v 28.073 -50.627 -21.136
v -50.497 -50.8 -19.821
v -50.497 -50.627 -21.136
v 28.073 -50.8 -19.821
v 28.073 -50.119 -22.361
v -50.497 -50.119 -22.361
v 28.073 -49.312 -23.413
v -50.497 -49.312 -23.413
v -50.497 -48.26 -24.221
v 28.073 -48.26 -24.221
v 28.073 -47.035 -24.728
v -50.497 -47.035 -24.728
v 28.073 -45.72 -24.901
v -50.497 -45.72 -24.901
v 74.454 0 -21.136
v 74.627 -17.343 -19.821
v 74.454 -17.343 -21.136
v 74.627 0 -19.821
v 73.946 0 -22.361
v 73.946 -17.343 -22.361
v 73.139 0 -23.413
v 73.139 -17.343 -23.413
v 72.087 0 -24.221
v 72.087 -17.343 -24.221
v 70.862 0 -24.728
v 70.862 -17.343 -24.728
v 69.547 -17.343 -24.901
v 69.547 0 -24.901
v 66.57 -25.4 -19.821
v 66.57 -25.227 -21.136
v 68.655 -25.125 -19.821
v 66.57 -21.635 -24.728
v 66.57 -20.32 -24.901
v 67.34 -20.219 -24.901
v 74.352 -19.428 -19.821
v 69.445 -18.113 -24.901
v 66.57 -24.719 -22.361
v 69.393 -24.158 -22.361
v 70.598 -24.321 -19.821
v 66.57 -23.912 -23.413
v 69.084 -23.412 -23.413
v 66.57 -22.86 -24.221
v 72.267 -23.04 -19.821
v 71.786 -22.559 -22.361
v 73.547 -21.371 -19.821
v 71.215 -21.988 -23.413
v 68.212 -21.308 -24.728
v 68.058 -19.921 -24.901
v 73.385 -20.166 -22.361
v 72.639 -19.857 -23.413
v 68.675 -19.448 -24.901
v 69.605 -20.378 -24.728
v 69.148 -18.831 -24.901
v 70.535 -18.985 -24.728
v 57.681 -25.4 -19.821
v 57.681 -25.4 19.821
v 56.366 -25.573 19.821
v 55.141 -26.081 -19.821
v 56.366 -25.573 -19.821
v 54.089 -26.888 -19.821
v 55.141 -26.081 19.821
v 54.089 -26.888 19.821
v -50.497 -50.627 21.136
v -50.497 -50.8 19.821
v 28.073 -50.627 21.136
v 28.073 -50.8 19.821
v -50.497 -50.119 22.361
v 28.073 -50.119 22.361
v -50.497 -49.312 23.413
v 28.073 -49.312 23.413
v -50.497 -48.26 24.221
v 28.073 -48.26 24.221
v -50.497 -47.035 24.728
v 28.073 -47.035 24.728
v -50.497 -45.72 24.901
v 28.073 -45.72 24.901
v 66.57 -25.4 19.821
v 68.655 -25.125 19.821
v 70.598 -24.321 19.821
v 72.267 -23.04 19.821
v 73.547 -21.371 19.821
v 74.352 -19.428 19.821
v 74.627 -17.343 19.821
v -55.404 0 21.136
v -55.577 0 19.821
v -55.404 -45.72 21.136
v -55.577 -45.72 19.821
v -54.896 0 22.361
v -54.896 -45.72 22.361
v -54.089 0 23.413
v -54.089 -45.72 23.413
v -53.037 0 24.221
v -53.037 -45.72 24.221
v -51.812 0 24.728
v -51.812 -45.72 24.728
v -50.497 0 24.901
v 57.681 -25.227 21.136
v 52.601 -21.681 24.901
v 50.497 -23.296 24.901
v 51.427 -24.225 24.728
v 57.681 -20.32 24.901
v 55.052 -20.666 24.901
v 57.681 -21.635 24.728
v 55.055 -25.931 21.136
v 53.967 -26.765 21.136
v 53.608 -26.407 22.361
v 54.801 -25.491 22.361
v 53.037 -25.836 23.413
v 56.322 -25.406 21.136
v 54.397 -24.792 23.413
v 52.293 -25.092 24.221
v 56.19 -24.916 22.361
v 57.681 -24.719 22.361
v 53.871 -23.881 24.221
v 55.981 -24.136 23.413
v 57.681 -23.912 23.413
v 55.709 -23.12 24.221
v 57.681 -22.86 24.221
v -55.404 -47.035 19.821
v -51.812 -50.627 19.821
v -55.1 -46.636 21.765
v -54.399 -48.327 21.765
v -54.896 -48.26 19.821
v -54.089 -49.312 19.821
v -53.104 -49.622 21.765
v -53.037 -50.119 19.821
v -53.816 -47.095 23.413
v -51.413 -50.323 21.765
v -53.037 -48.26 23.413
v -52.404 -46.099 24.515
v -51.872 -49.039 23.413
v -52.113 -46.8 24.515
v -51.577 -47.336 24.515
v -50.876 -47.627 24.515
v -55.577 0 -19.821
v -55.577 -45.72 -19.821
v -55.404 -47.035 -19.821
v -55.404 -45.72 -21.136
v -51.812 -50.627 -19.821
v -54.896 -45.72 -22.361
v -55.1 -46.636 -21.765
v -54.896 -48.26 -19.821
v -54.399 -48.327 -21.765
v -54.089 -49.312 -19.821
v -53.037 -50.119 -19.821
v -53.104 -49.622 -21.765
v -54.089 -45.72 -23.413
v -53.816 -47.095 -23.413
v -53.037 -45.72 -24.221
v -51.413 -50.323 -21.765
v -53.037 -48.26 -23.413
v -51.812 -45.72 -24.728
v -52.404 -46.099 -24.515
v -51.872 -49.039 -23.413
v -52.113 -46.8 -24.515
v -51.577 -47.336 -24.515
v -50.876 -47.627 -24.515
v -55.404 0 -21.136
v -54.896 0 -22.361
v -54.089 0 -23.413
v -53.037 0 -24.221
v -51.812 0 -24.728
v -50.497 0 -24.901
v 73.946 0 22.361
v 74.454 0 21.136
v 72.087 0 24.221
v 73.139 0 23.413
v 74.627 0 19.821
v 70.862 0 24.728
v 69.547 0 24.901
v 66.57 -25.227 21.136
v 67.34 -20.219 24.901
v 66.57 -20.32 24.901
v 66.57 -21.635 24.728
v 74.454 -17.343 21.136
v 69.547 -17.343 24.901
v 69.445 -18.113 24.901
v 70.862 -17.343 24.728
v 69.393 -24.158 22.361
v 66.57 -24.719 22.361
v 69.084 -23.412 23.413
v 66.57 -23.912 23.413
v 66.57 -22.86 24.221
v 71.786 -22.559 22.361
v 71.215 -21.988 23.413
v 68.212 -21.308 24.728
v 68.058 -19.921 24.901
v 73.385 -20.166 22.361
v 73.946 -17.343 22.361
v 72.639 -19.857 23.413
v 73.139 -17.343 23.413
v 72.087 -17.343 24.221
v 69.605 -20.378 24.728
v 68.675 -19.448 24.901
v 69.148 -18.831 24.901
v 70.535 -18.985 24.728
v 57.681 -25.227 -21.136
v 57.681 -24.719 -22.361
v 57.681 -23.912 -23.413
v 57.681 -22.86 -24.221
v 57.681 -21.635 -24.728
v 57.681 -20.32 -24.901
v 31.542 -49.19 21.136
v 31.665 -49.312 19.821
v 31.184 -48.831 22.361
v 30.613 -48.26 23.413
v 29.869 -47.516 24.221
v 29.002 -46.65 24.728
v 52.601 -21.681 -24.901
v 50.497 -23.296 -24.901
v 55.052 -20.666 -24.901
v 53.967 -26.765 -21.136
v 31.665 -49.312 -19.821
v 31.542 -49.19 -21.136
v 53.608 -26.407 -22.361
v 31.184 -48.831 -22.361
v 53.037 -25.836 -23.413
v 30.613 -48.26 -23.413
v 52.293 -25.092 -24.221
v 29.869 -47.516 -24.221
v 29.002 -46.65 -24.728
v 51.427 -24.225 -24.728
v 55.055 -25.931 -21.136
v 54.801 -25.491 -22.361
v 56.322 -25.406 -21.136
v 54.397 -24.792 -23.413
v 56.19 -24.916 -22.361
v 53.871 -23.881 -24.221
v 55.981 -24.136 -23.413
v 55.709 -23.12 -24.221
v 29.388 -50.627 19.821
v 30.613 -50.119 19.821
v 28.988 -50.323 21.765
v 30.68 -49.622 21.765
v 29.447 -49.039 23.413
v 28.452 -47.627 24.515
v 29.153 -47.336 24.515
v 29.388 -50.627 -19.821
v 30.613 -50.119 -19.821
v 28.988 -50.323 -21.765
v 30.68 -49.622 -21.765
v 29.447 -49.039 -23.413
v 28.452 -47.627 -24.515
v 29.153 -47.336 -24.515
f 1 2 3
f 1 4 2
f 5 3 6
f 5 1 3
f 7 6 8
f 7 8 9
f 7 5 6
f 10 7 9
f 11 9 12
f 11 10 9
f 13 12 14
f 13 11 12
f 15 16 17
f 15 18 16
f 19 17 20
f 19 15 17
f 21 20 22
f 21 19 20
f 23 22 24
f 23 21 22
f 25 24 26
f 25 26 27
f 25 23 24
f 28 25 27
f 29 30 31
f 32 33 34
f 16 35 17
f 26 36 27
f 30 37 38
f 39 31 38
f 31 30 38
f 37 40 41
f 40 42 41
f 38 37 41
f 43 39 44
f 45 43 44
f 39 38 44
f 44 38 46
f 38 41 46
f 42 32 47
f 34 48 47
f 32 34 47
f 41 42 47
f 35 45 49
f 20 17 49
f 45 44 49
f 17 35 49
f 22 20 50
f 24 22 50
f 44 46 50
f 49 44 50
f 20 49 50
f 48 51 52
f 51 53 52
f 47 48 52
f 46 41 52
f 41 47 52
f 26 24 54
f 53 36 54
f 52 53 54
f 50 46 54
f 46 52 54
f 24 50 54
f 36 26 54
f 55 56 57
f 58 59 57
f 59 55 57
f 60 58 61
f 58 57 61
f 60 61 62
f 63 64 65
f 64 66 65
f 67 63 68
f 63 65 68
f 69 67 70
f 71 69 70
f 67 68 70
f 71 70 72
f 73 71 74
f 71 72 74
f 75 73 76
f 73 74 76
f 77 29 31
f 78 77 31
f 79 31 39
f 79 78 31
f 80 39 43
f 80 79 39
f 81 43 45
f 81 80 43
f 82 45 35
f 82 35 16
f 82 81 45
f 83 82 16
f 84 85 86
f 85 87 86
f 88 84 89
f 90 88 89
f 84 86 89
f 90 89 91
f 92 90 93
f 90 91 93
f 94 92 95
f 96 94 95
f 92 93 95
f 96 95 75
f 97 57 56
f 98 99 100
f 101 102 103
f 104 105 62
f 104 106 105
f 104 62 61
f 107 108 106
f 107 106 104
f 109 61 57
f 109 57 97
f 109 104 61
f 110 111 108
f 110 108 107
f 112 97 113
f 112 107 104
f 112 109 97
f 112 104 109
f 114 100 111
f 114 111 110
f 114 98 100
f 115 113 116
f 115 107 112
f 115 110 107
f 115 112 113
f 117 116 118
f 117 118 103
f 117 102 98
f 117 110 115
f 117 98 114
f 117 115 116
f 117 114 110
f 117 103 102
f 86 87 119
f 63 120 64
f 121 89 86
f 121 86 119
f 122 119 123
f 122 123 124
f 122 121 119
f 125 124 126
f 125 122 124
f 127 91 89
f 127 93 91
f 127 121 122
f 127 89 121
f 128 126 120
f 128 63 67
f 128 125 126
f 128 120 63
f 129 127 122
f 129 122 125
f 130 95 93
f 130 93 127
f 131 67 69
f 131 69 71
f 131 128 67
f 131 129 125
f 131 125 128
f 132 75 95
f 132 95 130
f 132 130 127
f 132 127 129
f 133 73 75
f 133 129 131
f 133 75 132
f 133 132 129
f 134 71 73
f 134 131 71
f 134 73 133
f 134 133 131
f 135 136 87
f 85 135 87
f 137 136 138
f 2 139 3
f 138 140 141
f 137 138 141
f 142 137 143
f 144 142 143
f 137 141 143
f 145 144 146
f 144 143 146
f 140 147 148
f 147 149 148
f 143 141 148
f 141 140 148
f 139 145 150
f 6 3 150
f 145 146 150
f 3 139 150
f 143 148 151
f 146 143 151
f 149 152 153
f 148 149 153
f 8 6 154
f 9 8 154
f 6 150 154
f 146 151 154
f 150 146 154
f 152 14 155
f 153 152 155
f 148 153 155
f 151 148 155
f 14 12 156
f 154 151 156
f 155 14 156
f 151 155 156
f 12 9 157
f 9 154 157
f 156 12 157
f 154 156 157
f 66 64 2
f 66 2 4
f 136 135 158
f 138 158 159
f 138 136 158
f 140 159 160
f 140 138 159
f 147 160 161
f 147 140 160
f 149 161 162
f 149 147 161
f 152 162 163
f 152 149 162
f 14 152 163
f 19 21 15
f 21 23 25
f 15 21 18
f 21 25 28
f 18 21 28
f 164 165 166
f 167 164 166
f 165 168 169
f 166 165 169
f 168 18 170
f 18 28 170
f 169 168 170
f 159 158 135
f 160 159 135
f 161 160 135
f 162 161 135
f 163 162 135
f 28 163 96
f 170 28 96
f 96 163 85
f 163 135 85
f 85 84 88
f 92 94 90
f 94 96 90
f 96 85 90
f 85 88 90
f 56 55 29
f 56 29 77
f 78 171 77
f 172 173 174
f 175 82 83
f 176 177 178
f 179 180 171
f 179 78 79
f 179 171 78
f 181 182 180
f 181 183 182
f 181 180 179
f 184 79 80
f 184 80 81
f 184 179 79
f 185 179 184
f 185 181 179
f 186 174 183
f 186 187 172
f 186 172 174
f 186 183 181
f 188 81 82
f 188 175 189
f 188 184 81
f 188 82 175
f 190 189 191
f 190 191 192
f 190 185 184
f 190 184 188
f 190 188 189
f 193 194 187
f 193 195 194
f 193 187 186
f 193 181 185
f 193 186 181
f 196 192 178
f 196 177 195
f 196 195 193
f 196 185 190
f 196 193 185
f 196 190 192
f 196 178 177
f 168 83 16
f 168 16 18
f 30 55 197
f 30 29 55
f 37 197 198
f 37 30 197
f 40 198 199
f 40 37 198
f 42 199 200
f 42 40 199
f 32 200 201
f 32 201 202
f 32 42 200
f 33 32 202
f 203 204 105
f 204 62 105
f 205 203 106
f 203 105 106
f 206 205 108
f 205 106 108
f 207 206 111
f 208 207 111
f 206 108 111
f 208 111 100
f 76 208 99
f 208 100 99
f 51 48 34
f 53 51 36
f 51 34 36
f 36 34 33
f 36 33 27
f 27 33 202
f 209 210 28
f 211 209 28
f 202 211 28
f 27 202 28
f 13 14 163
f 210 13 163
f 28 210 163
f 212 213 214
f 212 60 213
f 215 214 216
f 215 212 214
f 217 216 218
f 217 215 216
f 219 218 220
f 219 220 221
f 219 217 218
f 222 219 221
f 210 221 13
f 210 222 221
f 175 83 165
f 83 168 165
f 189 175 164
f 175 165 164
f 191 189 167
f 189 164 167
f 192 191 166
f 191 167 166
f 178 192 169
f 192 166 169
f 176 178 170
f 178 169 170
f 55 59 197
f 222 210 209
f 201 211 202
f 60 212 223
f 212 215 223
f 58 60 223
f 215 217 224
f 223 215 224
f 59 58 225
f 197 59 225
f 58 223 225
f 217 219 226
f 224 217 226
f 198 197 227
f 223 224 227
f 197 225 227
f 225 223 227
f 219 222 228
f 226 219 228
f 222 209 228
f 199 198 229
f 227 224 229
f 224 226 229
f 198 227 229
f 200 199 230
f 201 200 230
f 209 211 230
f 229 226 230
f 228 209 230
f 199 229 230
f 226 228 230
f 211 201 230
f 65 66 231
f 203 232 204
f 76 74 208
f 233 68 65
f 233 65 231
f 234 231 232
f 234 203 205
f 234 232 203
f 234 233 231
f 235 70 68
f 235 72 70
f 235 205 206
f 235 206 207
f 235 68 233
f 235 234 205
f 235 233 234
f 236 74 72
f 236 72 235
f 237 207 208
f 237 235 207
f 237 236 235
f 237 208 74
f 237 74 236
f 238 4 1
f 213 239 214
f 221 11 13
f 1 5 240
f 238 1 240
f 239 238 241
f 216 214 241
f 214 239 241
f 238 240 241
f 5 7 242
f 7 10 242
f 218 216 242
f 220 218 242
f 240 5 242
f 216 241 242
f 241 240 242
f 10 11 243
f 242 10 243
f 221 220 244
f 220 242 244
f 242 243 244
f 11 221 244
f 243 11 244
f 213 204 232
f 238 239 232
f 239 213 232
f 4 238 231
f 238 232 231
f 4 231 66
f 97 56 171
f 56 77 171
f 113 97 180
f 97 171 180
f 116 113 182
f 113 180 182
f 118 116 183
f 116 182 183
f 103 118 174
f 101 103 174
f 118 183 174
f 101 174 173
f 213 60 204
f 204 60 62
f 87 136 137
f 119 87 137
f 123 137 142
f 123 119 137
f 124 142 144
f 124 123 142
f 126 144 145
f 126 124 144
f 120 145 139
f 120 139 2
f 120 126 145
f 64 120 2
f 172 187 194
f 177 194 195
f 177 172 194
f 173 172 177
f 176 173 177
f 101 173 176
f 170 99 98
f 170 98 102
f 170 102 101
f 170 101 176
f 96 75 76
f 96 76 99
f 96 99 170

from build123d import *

# Parameters (mm, degrees)
F0_W     = 111.1538112164
F0_H     = 49.8025715351
F1_DEPTH = 50.8
F2_R     = 5.08
F3_SIZE  = 25.4
F4_W     = 25.4
F4_H     = 49.8025715351
F5_DEPTH = 19.05
F6_R     = 8.0573195259
F7_F1_R  = 5.08
F7_F2_R  = 5.08
F7_F3_R  = 5.08
F7_F4_R  = 5.08


# Not quite as in the source:
# - a feature of the source that left no trace in its solid (it failed there, or was rolled back) is left out


with BuildPart() as f1:
    # F0 (on Front) → F1 (new body)
    with BuildSketch(Plane.XZ):
        Rectangle(F0_W, F0_H)
    extrude(amount=F1_DEPTH)

    # F2
    f2_edges = [f1.edges().sort_by_distance(p)[0] for p in [
        (-55.576906, -50.8, 0),
    ]]
    fillet(f2_edges, radius=F2_R)

    # F3
    f3_edges = [f1.edges().sort_by_distance(p)[0] for p in [
        (55.576906, -50.8, 0),
    ]]
    chamfer(f3_edges, length=F3_SIZE)

    # F4 (on face) → F5 (join)
    with BuildSketch(Plane.YZ.offset(55.5769056082)):
        with Locations((-12.7, 0)):
            Rectangle(F4_W, F4_H)
    extrude(amount=F5_DEPTH)

    # F6
    f6_edges = [f1.edges().sort_by_distance(p)[0] for p in [
        (74.626906, -25.4, 0),
    ]]
    fillet(f6_edges, radius=F6_R)

    # F7: fillet of radius 5.08 on 4 edges, made by hand

    # F7_f1
    f7_f1_edges = [f1.edges().sort_by_distance(p)[0] for p in [
        (55.5769056082, -25.4, 0),
    ]]
    fillet(f7_f1_edges, radius=F7_F1_R)

    # F7_f2
    f7_f2_edges = [f1.edges().sort_by_distance(p)[0] for p in [
        (30.1769056082, -50.8, 0),
    ]]
    fillet(f7_f2_edges, radius=F7_F2_R)

    # F7_f3
    f7_f3_edges = [f1.edges().sort_by_distance(p)[0] for p in [
        (42.8769056082, -38.1, 24.9012857676),
    ]]
    fillet(f7_f3_edges, radius=F7_F3_R)

    # F7_f4
    f7_f4_edges = [f1.edges().sort_by_distance(p)[0] for p in [
        (42.8769056082, -38.1, -24.9012857676),
    ]]
    fillet(f7_f4_edges, radius=F7_F4_R)


solid = f1.part
